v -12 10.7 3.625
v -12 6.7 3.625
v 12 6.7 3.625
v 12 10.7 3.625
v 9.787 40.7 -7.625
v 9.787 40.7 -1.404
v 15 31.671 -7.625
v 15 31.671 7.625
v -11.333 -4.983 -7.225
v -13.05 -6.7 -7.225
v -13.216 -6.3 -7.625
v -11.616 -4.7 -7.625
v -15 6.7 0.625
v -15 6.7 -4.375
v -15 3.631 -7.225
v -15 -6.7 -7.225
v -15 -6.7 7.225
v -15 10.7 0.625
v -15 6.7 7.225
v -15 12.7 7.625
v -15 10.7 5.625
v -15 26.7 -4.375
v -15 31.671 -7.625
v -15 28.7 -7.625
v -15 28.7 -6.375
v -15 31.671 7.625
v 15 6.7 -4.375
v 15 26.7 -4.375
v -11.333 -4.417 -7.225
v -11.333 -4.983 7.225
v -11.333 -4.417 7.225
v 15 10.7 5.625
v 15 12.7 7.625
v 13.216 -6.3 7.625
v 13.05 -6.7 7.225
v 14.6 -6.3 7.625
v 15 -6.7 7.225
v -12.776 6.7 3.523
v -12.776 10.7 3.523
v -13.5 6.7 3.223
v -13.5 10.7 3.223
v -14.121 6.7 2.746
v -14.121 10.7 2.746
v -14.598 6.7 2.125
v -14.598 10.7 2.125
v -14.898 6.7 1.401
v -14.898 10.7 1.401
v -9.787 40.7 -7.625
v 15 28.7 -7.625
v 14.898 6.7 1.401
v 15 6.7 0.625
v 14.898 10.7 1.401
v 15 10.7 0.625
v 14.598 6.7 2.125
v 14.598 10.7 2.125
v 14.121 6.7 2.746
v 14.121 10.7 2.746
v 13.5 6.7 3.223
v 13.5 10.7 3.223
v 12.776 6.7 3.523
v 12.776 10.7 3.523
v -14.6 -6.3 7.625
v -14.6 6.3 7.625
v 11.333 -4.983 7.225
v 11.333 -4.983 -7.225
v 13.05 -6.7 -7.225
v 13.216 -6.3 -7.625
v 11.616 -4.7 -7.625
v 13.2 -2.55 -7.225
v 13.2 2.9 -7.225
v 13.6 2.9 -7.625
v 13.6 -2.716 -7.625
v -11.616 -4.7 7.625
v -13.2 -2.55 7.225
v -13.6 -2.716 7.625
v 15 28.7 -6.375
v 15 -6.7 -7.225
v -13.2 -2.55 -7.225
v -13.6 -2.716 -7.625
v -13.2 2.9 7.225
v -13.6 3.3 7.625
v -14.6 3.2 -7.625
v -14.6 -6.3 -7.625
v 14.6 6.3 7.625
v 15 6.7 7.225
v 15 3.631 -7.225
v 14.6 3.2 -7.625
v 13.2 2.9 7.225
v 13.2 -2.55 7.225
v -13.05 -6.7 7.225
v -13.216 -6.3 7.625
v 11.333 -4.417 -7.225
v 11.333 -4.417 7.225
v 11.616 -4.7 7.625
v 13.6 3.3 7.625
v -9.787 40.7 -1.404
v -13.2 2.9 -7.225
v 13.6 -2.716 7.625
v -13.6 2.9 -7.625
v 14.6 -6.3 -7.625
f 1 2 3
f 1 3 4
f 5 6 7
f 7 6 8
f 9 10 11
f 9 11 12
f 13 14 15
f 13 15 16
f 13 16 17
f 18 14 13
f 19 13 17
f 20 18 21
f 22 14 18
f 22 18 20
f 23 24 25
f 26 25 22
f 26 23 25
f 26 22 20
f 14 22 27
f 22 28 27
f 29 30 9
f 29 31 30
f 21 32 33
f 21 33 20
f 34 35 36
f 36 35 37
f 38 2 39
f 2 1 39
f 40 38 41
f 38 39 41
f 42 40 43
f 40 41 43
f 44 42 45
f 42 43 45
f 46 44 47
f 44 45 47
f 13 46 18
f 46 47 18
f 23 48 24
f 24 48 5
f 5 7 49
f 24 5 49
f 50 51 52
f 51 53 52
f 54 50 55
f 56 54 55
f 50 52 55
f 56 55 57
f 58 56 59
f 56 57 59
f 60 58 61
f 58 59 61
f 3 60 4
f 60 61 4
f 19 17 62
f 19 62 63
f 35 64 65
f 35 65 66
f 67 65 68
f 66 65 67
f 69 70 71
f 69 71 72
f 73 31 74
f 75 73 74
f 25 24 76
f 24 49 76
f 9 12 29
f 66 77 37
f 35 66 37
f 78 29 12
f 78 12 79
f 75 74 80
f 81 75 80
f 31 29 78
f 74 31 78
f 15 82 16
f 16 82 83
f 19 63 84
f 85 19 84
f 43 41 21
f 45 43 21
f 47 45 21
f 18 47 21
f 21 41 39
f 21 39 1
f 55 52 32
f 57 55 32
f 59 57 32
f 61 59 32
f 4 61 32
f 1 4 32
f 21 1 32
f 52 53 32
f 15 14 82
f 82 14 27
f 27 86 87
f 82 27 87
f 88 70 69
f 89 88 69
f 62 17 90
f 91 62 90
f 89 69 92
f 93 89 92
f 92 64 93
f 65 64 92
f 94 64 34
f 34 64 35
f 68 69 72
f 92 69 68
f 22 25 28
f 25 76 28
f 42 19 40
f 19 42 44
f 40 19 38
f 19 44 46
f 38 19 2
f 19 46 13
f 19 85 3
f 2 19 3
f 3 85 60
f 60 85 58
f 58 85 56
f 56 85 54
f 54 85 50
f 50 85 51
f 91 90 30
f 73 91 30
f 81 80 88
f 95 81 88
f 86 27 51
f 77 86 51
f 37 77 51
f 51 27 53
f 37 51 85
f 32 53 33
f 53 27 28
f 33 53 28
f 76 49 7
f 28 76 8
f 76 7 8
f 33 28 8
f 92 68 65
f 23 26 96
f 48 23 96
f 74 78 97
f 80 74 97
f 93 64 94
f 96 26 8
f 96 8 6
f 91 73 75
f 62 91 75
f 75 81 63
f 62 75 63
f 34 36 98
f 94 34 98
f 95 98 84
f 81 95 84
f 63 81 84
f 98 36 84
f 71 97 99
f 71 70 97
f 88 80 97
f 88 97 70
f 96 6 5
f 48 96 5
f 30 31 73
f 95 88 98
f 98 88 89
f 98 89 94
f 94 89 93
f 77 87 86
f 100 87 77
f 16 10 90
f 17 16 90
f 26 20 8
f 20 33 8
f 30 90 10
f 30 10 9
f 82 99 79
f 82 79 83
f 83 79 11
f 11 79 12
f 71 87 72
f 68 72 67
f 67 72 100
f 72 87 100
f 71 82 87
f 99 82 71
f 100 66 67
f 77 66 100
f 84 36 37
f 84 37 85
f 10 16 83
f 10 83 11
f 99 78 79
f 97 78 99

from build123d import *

# Parameters (mm, degrees)
BOSS_EXTRUDE1_DEPTH = 15
FILLET1_R           = 3
CUT_EXTRUDE1_DEPTH  = 16.25
CHAMFER1_SIZE       = 0.4
CUT_EXTRUDE2_DEPTH  = 16.25
CHAMFER2_SIZE       = 2


with BuildPart() as part:
    # Sketch1 → Boss-Extrude1 (new body, symmetric)
    with BuildSketch(Plane(origin=(0, 0, 0), x_dir=(0, 0, -1), z_dir=(1, 0, 0))):
        Polygon((-7.625, 6.7), (-3.625, 6.7), (-3.625, 10.7), (-7.625, 10.7), (-7.625, 31.670562748), (1.404437252, 40.7), (7.625, 40.7), (7.625, 28.7), (6.375, 28.7), (4.375, 26.7), (4.375, 6.7), (7.625, 3.2), (7.625, -6.7), (-7.625, -6.7), align=None)
    extrude(amount=BOSS_EXTRUDE1_DEPTH, both=True)

    # Fillet1
    fillet1_edges = [part.edges().sort_by_distance(p)[0] for p in [
        (-15, 8.7, 3.625),
        (15, 8.7, 3.625),
    ]]
    fillet(fillet1_edges, radius=FILLET1_R)

    # Sketch2 → Cut-Extrude1 (cut, through all)
    with BuildSketch(Plane.XY.offset(7.625)):
        Polygon((-13.2, 2.9), (13.2, 2.9), (13.2, -2.55), (11.05, -4.7), (13.05, -6.7), (-13.05, -6.7), (-11.05, -4.7), (-13.2, -2.55), align=None)
    extrude(amount=-CUT_EXTRUDE1_DEPTH, mode=Mode.SUBTRACT)

    # Chamfer1
    chamfer1_edges = [part.edges().sort_by_distance(p)[0] for p in [
        (15, -1.75, -7.625),
        (-15, -1.75, -7.625),
        (-15, 0, 7.625),
        (0, 6.7, 7.625),
        (14.025, -6.7, -7.625),
        (14.025, -6.7, 7.625),
        (15, 0, 7.625),
        (-14.025, -6.7, -7.625),
        (-14.025, -6.7, 7.625),
        (-13.2, 0.175, -7.625),
        (13.2, 0.175, -7.625),
        (12.125, -3.625, -7.625),
        (12.05, -5.7, -7.625),
        (11.05, -4.7, 0),
        (-12.05, -5.7, -7.625),
        (-12.125, -3.625, -7.625),
        (-11.05, -4.7, 0),
        (-13.2, 0.175, 7.625),
        (-12.125, -3.625, 7.625),
        (-12.05, -5.7, 7.625),
        (12.05, -5.7, 7.625),
        (12.125, -3.625, 7.625),
        (13.2, 0.175, 7.625),
        (0, 2.9, 7.625),
    ]]
    chamfer(chamfer1_edges, length=CHAMFER1_SIZE)

    # Sketch3 → Cut-Extrude2 (cut, through all)
    with BuildSketch(Plane.XY.offset(7.625)):
        Polygon((-15, 31.670562748), (-9.786851972, 40.7), (-15, 40.7), align=None)
        Polygon((15, 31.670562748), (15, 40.7), (9.786851972, 40.7), align=None)
    extrude(amount=-CUT_EXTRUDE2_DEPTH, mode=Mode.SUBTRACT)

    # Chamfer2
    chamfer2_edges = [part.edges().sort_by_distance(p)[0] for p in [
        (0, 10.7, 7.625),
    ]]
    chamfer(chamfer2_edges, length=CHAMFER2_SIZE)


solid = part.part
